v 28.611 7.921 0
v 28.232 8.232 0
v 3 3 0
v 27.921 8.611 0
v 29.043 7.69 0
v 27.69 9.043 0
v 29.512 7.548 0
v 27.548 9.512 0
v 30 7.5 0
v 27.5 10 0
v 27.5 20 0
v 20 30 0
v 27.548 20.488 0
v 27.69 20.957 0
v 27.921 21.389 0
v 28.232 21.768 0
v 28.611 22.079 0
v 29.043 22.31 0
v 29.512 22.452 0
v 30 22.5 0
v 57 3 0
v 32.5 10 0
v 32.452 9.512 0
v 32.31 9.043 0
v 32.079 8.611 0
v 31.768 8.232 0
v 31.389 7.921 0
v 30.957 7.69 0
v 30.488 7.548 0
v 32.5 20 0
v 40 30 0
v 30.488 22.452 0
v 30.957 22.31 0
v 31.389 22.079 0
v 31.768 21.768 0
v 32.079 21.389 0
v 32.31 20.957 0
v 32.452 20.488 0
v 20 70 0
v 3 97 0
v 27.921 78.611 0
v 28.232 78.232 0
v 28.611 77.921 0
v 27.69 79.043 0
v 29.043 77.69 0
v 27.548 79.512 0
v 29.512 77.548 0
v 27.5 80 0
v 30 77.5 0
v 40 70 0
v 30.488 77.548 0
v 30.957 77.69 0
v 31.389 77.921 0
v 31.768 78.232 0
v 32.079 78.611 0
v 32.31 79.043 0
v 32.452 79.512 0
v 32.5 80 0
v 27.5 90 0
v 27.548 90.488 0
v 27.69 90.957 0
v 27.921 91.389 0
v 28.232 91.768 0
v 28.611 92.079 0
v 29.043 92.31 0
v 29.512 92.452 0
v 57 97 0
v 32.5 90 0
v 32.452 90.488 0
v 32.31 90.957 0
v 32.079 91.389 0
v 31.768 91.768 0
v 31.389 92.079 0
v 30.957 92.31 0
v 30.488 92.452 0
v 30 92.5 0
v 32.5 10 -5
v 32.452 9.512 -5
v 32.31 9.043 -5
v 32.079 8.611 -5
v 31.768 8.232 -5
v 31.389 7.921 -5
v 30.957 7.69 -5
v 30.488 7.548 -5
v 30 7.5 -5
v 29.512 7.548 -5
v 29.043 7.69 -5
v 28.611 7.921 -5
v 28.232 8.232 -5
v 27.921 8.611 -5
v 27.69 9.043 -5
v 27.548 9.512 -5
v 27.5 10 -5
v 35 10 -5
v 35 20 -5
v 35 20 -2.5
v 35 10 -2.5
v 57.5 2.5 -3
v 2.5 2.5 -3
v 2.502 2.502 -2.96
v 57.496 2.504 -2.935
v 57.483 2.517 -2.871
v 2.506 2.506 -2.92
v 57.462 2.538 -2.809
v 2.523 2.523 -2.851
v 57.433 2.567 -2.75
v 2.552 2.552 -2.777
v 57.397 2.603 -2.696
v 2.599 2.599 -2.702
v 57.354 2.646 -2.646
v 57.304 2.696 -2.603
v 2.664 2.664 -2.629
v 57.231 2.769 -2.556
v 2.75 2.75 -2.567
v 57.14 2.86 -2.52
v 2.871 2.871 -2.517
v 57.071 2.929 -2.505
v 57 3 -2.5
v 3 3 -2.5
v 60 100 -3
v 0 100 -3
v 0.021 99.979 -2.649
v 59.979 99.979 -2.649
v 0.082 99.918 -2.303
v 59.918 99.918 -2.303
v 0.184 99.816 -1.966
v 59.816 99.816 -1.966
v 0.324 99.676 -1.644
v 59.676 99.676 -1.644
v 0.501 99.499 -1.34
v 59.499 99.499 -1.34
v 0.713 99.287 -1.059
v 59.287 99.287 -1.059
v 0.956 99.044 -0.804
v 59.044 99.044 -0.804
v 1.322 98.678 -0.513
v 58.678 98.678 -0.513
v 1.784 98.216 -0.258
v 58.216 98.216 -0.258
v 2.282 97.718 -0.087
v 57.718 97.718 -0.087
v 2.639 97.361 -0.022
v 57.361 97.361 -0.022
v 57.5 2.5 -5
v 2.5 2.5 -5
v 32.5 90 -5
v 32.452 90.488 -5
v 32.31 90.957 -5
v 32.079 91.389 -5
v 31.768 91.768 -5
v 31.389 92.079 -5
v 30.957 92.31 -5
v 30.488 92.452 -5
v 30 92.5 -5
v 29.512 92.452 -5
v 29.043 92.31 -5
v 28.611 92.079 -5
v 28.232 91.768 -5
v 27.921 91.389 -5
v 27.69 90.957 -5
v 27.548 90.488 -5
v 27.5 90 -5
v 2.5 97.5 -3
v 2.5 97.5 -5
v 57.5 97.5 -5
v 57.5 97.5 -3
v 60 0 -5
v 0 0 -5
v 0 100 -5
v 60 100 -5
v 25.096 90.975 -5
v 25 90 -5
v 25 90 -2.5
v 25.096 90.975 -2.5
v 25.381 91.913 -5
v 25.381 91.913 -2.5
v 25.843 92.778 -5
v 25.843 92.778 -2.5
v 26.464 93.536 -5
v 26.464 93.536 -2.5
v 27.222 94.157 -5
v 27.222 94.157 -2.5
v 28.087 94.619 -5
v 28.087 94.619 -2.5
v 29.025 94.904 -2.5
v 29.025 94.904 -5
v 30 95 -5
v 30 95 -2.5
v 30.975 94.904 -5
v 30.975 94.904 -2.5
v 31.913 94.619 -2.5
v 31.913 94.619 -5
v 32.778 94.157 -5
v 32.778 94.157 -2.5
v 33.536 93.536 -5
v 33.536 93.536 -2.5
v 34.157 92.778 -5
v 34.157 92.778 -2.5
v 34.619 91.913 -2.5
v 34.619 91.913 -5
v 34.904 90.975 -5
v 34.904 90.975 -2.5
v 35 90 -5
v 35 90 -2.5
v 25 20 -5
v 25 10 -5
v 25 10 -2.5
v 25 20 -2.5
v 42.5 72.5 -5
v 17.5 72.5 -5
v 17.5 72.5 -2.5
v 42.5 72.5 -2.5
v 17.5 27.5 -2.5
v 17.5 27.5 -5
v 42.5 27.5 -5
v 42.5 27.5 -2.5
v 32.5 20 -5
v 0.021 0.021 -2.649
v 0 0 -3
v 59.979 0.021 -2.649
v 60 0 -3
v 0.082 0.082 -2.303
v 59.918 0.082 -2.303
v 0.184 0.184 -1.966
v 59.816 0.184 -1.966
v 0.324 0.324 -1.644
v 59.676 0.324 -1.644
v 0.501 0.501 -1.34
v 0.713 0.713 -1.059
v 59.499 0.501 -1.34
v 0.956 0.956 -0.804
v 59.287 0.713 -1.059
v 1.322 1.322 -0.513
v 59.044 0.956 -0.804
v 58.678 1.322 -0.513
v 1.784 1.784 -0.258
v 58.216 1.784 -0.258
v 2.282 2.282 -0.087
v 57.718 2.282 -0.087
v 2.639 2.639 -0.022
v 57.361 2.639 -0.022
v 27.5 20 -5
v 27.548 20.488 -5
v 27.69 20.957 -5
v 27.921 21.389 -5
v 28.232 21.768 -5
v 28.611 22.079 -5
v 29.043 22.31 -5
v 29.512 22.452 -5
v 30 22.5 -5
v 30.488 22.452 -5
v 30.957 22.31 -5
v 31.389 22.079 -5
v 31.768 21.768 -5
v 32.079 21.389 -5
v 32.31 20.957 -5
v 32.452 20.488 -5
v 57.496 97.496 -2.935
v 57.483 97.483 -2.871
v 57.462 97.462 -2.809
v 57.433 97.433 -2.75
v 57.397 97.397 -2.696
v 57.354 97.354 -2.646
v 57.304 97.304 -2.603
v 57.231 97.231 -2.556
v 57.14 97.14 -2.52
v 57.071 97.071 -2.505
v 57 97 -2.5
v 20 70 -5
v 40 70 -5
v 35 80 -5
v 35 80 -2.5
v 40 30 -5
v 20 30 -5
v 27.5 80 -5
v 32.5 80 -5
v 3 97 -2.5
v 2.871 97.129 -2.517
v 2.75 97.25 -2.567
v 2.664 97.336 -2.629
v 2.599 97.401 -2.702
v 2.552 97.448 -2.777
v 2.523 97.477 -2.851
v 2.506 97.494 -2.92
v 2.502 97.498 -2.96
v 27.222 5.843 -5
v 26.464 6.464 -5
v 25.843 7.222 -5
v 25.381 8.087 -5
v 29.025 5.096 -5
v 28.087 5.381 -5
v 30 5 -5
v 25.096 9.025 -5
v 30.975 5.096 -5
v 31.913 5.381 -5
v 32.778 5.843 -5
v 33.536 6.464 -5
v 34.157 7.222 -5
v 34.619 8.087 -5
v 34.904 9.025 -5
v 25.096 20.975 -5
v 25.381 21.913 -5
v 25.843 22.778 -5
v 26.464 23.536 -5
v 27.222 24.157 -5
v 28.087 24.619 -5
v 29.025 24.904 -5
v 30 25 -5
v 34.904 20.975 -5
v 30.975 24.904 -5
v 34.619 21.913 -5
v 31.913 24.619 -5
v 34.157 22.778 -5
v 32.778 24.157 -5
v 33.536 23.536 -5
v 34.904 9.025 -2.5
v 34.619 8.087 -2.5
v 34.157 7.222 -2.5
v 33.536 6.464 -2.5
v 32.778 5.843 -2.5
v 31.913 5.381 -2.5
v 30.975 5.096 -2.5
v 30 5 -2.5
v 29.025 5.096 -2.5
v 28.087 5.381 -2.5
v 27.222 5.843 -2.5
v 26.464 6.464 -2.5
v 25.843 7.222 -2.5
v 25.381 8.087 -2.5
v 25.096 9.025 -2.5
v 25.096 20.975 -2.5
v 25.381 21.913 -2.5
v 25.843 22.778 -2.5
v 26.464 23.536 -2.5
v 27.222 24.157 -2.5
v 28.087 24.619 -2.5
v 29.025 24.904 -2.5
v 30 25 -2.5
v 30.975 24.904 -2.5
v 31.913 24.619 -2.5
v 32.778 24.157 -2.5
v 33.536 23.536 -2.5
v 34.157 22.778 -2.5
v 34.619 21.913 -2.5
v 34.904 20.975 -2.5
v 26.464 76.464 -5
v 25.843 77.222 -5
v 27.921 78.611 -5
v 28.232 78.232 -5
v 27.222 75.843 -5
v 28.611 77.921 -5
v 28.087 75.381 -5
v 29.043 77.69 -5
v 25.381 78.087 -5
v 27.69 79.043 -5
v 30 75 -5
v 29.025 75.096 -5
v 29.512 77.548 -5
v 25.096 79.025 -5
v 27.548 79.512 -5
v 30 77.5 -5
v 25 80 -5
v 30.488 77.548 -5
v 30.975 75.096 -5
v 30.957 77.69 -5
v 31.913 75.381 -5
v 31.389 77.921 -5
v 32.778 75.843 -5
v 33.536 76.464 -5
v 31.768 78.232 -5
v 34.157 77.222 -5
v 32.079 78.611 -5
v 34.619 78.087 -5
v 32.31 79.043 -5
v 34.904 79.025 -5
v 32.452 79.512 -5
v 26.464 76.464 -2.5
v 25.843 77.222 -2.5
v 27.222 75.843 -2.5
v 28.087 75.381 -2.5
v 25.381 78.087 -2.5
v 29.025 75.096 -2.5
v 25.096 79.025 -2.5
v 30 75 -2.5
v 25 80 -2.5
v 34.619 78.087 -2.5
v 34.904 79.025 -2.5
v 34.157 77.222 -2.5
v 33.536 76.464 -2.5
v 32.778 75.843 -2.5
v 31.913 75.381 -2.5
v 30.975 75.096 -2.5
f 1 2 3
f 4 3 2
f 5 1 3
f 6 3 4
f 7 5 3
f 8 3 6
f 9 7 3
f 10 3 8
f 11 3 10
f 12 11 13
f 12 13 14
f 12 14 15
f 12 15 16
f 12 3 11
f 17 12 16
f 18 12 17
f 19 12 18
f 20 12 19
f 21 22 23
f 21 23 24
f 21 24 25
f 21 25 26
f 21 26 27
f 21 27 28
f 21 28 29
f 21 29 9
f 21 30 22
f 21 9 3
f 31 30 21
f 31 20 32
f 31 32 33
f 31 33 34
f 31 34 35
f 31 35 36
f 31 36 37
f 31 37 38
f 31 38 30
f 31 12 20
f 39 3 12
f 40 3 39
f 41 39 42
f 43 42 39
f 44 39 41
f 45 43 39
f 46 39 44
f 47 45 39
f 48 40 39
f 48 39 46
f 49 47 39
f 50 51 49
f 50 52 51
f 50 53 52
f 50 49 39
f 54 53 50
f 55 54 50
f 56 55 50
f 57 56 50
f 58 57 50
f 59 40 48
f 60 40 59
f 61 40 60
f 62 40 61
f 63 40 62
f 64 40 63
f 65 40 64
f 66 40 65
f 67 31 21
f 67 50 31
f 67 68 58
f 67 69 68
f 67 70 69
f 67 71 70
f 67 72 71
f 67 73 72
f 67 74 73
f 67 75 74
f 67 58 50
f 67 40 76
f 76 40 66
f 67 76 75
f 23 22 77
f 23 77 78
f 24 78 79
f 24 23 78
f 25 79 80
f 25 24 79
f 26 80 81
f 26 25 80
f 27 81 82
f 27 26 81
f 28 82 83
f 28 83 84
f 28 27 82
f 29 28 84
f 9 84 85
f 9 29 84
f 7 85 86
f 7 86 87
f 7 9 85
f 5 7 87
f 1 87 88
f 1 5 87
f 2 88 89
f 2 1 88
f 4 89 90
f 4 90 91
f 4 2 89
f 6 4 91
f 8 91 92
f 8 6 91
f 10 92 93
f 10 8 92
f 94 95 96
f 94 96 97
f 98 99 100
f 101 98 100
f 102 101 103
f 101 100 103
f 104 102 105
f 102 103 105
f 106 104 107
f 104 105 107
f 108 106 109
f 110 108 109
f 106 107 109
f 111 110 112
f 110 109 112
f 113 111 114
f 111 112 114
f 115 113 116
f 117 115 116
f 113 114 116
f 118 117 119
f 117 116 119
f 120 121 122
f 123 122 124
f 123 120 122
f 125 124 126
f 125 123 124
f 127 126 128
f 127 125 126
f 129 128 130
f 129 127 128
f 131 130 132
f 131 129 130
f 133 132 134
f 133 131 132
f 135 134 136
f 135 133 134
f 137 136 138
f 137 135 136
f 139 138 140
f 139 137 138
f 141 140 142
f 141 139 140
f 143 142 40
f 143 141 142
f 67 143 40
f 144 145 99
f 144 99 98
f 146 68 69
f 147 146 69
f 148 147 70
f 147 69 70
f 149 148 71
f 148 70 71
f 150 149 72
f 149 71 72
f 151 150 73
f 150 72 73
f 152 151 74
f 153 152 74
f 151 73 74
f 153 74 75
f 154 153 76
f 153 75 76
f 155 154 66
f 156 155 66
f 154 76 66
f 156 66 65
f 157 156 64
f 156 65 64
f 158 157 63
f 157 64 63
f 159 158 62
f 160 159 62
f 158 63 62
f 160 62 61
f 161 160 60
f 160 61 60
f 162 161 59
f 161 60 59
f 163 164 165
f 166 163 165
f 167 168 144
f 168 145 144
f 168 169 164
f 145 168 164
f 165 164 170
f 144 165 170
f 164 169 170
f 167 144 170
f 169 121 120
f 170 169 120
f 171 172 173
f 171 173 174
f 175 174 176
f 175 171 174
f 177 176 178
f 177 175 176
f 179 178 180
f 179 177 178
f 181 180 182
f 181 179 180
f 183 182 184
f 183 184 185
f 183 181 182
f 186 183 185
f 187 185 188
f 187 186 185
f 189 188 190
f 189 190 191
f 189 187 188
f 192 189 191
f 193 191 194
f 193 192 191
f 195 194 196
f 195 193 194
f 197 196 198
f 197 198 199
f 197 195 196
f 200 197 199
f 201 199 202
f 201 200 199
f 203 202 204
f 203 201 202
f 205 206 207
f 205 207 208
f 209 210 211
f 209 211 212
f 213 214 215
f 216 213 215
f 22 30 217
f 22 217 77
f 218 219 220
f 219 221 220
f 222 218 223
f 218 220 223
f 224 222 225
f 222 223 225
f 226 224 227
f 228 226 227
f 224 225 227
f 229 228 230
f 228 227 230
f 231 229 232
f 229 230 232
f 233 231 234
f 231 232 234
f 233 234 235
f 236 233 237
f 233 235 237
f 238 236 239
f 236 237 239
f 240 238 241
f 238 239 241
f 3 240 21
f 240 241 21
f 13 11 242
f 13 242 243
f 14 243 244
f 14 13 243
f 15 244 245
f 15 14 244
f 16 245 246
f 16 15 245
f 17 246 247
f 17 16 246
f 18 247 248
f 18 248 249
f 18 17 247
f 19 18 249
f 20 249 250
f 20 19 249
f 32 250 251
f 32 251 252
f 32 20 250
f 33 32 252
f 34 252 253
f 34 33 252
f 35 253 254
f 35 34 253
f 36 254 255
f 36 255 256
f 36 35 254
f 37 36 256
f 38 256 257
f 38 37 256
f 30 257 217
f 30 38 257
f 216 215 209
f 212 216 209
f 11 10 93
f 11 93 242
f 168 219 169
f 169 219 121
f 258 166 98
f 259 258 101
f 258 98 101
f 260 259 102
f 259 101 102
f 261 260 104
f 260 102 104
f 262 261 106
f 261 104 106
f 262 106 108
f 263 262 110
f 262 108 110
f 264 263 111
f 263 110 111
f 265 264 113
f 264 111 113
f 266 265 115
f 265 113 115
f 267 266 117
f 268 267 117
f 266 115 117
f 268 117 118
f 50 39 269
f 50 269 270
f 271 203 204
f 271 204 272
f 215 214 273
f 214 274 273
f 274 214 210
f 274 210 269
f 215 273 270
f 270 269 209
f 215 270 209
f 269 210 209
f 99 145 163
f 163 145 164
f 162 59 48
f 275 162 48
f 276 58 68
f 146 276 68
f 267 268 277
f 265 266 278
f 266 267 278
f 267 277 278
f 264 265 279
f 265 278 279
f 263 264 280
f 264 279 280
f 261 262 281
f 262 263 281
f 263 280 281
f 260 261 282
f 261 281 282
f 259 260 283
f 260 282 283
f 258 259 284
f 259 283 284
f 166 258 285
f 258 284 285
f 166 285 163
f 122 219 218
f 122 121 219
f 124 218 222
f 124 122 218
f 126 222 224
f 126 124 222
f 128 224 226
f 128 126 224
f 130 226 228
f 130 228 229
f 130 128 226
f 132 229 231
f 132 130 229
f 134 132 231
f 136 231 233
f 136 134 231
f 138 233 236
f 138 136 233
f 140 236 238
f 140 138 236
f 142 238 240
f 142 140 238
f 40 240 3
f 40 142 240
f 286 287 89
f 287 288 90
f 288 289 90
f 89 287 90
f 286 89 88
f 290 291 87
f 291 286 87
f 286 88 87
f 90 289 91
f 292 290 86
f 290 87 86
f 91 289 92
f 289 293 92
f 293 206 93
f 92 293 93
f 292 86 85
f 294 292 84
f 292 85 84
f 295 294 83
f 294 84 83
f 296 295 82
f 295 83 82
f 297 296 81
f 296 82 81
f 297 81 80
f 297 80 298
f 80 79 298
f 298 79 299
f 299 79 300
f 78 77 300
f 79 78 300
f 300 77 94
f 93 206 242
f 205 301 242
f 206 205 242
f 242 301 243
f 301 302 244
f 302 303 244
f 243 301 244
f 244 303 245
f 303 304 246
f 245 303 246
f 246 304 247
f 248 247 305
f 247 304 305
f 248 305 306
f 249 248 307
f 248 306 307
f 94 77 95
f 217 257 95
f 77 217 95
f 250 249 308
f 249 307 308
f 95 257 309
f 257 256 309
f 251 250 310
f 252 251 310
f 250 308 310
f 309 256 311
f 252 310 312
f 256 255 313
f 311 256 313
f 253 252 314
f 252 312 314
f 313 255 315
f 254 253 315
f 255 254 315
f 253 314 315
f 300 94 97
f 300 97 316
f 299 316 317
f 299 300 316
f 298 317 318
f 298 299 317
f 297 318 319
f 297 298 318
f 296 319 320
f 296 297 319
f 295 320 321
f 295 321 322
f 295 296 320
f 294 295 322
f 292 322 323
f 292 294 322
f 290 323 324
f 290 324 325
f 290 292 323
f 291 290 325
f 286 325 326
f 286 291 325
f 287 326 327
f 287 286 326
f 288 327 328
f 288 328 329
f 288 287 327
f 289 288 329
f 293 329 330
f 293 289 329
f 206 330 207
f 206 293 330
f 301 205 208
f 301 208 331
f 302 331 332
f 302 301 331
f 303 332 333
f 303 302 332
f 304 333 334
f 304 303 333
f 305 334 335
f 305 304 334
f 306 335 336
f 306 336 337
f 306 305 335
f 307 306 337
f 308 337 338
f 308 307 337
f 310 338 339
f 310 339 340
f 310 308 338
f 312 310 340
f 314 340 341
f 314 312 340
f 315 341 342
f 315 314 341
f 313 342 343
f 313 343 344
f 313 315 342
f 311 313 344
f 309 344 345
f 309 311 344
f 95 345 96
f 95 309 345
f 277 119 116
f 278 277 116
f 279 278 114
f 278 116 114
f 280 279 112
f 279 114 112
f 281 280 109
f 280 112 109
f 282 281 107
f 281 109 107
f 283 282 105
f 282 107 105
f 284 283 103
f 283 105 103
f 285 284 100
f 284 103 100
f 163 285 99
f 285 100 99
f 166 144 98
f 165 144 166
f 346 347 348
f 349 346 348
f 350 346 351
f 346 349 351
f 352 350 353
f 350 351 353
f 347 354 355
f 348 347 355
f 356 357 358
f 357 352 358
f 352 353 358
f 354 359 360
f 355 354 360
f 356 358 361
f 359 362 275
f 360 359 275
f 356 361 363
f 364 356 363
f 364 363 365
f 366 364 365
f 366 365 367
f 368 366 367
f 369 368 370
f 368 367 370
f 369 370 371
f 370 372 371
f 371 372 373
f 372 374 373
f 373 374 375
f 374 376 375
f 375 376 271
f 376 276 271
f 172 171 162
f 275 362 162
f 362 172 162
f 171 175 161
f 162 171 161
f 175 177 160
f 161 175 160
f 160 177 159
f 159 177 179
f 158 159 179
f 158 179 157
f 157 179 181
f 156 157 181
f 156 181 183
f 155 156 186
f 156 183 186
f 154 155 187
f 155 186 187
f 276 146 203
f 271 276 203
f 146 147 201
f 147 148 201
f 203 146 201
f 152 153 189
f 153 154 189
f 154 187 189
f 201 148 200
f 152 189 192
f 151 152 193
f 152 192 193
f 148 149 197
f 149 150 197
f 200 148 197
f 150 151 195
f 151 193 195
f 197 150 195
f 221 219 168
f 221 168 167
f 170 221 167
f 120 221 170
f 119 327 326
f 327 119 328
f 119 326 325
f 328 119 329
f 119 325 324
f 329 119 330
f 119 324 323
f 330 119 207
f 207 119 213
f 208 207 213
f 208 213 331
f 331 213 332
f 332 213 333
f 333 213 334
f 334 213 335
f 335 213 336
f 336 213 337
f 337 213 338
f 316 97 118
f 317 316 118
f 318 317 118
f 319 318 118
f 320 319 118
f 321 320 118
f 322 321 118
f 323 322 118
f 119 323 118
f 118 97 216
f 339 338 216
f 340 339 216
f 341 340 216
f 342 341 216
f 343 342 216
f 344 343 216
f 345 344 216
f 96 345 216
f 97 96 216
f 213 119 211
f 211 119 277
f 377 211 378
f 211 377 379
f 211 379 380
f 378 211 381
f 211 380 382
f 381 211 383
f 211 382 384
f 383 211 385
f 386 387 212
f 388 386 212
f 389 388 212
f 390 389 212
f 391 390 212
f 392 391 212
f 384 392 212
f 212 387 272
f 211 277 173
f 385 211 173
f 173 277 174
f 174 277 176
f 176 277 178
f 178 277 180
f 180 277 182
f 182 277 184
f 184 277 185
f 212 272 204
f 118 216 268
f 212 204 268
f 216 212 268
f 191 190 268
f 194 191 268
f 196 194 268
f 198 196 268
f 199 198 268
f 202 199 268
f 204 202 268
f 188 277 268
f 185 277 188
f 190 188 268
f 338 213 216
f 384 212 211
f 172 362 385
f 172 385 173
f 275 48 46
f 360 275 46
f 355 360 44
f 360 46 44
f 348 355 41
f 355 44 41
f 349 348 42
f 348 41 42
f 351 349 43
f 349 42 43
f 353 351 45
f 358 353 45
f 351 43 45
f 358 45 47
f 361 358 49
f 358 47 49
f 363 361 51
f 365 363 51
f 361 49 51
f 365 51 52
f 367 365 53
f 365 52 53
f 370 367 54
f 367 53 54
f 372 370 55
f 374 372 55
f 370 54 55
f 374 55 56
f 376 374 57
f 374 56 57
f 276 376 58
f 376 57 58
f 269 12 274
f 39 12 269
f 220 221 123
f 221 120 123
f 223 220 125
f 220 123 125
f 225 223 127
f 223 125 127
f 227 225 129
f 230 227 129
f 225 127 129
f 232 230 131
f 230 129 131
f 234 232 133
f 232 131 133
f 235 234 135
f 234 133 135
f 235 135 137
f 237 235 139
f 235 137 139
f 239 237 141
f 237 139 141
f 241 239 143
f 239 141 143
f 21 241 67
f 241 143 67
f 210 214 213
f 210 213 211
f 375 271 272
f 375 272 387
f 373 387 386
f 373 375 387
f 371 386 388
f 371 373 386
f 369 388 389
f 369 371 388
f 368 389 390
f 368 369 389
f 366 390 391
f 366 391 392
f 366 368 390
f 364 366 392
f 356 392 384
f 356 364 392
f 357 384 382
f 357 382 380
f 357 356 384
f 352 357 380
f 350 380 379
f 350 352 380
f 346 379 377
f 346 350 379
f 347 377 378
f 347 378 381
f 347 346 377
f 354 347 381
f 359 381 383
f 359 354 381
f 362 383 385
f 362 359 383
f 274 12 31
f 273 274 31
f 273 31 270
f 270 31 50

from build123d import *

# Parameters (mm, degrees)
SKETCH1_W          = 60
SKETCH1_H          = 100
SKETCH1_W_2        = 20
SKETCH1_H_2        = 40
EXTRUDE1_DEPTH     = 5
FILLET2_R          = 3
SHELL2_START       = -5
SHELL2_OUTLINE_W   = 55
SHELL2_OUTLINE_H   = 95
SHELL2_OUTLINE_W_2 = 25
SHELL2_OUTLINE_H_2 = 45
SHELL2_DEPTH       = 2.5
SHELL2_START_2     = 2.5
SHELL2_2_DEPTH     = 95
SHELL2_START_3     = 2
SHELL2_3_DEPTH     = 56


with BuildPart() as part:
    # Sketch1 → Extrude1 (new body)
    with BuildSketch(Plane.XY):
        with Locations((30, 50)):
            Rectangle(SKETCH1_W, SKETCH1_H)
        with Locations((30, 50)):
            Rectangle(SKETCH1_W_2, SKETCH1_H_2, mode=Mode.SUBTRACT)
        with BuildLine():
            Line((32.5, 80), (32.5, 90))
            ThreePointArc((32.5, 90), (30, 92.5), (27.5, 90))
            Line((27.5, 90), (27.5, 80))
            ThreePointArc((27.5, 80), (30, 77.5), (32.5, 80))
        make_face(mode=Mode.SUBTRACT)
        with BuildLine():
            Line((27.5, 10), (27.5, 20))
            ThreePointArc((27.5, 20), (30, 22.5), (32.5, 20))
            Line((32.5, 20), (32.5, 10))
            ThreePointArc((32.5, 10), (30, 7.5), (27.5, 10))
        make_face(mode=Mode.SUBTRACT)
    extrude(amount=-EXTRUDE1_DEPTH)

    # Fillet2
    fillet2_edges = [part.edges().sort_by_distance(p)[0] for p in [
        (30, 100, 0),
        (60, 50, 0),
        (30, 0, 0),
        (0, 50, 0),
    ]]
    fillet(fillet2_edges, radius=FILLET2_R)

    # Shell2: read off the stored shape, not the designer's step
    # Shell2 outline → Shell2 (cut)
    with BuildSketch(Plane.XY.offset(SHELL2_START)):
        with Locations((30, 50)):
            Rectangle(SHELL2_OUTLINE_W, SHELL2_OUTLINE_H)
        with BuildLine():
            Line((25, 10), (25, 20))
            ThreePointArc((25, 20), (30, 25), (35, 20))
            Line((35, 20), (35, 10))
            ThreePointArc((35, 10), (30, 5), (25, 10))
        make_face(mode=Mode.SUBTRACT)
        with Locations((30, 50)):
            Rectangle(SHELL2_OUTLINE_W_2, SHELL2_OUTLINE_H_2, mode=Mode.SUBTRACT)
        with BuildLine():
            ThreePointArc((35, 80), (30, 75), (25, 80))
            Line((25, 80), (25, 90))
            ThreePointArc((25, 90), (30, 95), (35, 90))
            Line((35, 90), (35, 80))
        make_face(mode=Mode.SUBTRACT)
    extrude(amount=SHELL2_DEPTH, mode=Mode.SUBTRACT)

    # Shell2 2 outline → Shell2 2 (add)
    with BuildSketch(Plane(origin=(0, 0, 0), x_dir=(1, 0, 0), z_dir=(0, 1, 0)).offset(SHELL2_START_2)):
        with BuildLine():
            Line((57.5, 2.5), (57.5, 3))
            ThreePointArc((57.5, 3), (57.353553391, 2.646446609), (57, 2.5))
            Line((57, 2.5), (57.5, 2.5))
        make_face()
        with BuildLine():
            Line((2.5, 2.5), (3, 2.5))
            ThreePointArc((3, 2.5), (2.646446609, 2.646446609), (2.5, 3))
            Line((2.5, 3), (2.5, 2.5))
        make_face()
    extrude(amount=SHELL2_2_DEPTH)

    # Shell2 3 outline → Shell2 3 (add)
    with BuildSketch(Plane.YZ.offset(SHELL2_START_3)):
        with BuildLine():
            ThreePointArc((2.5, -3), (2.646446609, -2.646446609), (3, -2.5))
            Line((3, -2.5), (2.5, -2.5))
            Line((2.5, -2.5), (2.5, -3))
        make_face()
        with BuildLine():
            ThreePointArc((97, -2.5), (97.353553391, -2.646446609), (97.5, -3))
            Line((97.5, -3), (97.5, -2.5))
            Line((97.5, -2.5), (97, -2.5))
        make_face()
    extrude(amount=SHELL2_3_DEPTH)


solid = part.part
